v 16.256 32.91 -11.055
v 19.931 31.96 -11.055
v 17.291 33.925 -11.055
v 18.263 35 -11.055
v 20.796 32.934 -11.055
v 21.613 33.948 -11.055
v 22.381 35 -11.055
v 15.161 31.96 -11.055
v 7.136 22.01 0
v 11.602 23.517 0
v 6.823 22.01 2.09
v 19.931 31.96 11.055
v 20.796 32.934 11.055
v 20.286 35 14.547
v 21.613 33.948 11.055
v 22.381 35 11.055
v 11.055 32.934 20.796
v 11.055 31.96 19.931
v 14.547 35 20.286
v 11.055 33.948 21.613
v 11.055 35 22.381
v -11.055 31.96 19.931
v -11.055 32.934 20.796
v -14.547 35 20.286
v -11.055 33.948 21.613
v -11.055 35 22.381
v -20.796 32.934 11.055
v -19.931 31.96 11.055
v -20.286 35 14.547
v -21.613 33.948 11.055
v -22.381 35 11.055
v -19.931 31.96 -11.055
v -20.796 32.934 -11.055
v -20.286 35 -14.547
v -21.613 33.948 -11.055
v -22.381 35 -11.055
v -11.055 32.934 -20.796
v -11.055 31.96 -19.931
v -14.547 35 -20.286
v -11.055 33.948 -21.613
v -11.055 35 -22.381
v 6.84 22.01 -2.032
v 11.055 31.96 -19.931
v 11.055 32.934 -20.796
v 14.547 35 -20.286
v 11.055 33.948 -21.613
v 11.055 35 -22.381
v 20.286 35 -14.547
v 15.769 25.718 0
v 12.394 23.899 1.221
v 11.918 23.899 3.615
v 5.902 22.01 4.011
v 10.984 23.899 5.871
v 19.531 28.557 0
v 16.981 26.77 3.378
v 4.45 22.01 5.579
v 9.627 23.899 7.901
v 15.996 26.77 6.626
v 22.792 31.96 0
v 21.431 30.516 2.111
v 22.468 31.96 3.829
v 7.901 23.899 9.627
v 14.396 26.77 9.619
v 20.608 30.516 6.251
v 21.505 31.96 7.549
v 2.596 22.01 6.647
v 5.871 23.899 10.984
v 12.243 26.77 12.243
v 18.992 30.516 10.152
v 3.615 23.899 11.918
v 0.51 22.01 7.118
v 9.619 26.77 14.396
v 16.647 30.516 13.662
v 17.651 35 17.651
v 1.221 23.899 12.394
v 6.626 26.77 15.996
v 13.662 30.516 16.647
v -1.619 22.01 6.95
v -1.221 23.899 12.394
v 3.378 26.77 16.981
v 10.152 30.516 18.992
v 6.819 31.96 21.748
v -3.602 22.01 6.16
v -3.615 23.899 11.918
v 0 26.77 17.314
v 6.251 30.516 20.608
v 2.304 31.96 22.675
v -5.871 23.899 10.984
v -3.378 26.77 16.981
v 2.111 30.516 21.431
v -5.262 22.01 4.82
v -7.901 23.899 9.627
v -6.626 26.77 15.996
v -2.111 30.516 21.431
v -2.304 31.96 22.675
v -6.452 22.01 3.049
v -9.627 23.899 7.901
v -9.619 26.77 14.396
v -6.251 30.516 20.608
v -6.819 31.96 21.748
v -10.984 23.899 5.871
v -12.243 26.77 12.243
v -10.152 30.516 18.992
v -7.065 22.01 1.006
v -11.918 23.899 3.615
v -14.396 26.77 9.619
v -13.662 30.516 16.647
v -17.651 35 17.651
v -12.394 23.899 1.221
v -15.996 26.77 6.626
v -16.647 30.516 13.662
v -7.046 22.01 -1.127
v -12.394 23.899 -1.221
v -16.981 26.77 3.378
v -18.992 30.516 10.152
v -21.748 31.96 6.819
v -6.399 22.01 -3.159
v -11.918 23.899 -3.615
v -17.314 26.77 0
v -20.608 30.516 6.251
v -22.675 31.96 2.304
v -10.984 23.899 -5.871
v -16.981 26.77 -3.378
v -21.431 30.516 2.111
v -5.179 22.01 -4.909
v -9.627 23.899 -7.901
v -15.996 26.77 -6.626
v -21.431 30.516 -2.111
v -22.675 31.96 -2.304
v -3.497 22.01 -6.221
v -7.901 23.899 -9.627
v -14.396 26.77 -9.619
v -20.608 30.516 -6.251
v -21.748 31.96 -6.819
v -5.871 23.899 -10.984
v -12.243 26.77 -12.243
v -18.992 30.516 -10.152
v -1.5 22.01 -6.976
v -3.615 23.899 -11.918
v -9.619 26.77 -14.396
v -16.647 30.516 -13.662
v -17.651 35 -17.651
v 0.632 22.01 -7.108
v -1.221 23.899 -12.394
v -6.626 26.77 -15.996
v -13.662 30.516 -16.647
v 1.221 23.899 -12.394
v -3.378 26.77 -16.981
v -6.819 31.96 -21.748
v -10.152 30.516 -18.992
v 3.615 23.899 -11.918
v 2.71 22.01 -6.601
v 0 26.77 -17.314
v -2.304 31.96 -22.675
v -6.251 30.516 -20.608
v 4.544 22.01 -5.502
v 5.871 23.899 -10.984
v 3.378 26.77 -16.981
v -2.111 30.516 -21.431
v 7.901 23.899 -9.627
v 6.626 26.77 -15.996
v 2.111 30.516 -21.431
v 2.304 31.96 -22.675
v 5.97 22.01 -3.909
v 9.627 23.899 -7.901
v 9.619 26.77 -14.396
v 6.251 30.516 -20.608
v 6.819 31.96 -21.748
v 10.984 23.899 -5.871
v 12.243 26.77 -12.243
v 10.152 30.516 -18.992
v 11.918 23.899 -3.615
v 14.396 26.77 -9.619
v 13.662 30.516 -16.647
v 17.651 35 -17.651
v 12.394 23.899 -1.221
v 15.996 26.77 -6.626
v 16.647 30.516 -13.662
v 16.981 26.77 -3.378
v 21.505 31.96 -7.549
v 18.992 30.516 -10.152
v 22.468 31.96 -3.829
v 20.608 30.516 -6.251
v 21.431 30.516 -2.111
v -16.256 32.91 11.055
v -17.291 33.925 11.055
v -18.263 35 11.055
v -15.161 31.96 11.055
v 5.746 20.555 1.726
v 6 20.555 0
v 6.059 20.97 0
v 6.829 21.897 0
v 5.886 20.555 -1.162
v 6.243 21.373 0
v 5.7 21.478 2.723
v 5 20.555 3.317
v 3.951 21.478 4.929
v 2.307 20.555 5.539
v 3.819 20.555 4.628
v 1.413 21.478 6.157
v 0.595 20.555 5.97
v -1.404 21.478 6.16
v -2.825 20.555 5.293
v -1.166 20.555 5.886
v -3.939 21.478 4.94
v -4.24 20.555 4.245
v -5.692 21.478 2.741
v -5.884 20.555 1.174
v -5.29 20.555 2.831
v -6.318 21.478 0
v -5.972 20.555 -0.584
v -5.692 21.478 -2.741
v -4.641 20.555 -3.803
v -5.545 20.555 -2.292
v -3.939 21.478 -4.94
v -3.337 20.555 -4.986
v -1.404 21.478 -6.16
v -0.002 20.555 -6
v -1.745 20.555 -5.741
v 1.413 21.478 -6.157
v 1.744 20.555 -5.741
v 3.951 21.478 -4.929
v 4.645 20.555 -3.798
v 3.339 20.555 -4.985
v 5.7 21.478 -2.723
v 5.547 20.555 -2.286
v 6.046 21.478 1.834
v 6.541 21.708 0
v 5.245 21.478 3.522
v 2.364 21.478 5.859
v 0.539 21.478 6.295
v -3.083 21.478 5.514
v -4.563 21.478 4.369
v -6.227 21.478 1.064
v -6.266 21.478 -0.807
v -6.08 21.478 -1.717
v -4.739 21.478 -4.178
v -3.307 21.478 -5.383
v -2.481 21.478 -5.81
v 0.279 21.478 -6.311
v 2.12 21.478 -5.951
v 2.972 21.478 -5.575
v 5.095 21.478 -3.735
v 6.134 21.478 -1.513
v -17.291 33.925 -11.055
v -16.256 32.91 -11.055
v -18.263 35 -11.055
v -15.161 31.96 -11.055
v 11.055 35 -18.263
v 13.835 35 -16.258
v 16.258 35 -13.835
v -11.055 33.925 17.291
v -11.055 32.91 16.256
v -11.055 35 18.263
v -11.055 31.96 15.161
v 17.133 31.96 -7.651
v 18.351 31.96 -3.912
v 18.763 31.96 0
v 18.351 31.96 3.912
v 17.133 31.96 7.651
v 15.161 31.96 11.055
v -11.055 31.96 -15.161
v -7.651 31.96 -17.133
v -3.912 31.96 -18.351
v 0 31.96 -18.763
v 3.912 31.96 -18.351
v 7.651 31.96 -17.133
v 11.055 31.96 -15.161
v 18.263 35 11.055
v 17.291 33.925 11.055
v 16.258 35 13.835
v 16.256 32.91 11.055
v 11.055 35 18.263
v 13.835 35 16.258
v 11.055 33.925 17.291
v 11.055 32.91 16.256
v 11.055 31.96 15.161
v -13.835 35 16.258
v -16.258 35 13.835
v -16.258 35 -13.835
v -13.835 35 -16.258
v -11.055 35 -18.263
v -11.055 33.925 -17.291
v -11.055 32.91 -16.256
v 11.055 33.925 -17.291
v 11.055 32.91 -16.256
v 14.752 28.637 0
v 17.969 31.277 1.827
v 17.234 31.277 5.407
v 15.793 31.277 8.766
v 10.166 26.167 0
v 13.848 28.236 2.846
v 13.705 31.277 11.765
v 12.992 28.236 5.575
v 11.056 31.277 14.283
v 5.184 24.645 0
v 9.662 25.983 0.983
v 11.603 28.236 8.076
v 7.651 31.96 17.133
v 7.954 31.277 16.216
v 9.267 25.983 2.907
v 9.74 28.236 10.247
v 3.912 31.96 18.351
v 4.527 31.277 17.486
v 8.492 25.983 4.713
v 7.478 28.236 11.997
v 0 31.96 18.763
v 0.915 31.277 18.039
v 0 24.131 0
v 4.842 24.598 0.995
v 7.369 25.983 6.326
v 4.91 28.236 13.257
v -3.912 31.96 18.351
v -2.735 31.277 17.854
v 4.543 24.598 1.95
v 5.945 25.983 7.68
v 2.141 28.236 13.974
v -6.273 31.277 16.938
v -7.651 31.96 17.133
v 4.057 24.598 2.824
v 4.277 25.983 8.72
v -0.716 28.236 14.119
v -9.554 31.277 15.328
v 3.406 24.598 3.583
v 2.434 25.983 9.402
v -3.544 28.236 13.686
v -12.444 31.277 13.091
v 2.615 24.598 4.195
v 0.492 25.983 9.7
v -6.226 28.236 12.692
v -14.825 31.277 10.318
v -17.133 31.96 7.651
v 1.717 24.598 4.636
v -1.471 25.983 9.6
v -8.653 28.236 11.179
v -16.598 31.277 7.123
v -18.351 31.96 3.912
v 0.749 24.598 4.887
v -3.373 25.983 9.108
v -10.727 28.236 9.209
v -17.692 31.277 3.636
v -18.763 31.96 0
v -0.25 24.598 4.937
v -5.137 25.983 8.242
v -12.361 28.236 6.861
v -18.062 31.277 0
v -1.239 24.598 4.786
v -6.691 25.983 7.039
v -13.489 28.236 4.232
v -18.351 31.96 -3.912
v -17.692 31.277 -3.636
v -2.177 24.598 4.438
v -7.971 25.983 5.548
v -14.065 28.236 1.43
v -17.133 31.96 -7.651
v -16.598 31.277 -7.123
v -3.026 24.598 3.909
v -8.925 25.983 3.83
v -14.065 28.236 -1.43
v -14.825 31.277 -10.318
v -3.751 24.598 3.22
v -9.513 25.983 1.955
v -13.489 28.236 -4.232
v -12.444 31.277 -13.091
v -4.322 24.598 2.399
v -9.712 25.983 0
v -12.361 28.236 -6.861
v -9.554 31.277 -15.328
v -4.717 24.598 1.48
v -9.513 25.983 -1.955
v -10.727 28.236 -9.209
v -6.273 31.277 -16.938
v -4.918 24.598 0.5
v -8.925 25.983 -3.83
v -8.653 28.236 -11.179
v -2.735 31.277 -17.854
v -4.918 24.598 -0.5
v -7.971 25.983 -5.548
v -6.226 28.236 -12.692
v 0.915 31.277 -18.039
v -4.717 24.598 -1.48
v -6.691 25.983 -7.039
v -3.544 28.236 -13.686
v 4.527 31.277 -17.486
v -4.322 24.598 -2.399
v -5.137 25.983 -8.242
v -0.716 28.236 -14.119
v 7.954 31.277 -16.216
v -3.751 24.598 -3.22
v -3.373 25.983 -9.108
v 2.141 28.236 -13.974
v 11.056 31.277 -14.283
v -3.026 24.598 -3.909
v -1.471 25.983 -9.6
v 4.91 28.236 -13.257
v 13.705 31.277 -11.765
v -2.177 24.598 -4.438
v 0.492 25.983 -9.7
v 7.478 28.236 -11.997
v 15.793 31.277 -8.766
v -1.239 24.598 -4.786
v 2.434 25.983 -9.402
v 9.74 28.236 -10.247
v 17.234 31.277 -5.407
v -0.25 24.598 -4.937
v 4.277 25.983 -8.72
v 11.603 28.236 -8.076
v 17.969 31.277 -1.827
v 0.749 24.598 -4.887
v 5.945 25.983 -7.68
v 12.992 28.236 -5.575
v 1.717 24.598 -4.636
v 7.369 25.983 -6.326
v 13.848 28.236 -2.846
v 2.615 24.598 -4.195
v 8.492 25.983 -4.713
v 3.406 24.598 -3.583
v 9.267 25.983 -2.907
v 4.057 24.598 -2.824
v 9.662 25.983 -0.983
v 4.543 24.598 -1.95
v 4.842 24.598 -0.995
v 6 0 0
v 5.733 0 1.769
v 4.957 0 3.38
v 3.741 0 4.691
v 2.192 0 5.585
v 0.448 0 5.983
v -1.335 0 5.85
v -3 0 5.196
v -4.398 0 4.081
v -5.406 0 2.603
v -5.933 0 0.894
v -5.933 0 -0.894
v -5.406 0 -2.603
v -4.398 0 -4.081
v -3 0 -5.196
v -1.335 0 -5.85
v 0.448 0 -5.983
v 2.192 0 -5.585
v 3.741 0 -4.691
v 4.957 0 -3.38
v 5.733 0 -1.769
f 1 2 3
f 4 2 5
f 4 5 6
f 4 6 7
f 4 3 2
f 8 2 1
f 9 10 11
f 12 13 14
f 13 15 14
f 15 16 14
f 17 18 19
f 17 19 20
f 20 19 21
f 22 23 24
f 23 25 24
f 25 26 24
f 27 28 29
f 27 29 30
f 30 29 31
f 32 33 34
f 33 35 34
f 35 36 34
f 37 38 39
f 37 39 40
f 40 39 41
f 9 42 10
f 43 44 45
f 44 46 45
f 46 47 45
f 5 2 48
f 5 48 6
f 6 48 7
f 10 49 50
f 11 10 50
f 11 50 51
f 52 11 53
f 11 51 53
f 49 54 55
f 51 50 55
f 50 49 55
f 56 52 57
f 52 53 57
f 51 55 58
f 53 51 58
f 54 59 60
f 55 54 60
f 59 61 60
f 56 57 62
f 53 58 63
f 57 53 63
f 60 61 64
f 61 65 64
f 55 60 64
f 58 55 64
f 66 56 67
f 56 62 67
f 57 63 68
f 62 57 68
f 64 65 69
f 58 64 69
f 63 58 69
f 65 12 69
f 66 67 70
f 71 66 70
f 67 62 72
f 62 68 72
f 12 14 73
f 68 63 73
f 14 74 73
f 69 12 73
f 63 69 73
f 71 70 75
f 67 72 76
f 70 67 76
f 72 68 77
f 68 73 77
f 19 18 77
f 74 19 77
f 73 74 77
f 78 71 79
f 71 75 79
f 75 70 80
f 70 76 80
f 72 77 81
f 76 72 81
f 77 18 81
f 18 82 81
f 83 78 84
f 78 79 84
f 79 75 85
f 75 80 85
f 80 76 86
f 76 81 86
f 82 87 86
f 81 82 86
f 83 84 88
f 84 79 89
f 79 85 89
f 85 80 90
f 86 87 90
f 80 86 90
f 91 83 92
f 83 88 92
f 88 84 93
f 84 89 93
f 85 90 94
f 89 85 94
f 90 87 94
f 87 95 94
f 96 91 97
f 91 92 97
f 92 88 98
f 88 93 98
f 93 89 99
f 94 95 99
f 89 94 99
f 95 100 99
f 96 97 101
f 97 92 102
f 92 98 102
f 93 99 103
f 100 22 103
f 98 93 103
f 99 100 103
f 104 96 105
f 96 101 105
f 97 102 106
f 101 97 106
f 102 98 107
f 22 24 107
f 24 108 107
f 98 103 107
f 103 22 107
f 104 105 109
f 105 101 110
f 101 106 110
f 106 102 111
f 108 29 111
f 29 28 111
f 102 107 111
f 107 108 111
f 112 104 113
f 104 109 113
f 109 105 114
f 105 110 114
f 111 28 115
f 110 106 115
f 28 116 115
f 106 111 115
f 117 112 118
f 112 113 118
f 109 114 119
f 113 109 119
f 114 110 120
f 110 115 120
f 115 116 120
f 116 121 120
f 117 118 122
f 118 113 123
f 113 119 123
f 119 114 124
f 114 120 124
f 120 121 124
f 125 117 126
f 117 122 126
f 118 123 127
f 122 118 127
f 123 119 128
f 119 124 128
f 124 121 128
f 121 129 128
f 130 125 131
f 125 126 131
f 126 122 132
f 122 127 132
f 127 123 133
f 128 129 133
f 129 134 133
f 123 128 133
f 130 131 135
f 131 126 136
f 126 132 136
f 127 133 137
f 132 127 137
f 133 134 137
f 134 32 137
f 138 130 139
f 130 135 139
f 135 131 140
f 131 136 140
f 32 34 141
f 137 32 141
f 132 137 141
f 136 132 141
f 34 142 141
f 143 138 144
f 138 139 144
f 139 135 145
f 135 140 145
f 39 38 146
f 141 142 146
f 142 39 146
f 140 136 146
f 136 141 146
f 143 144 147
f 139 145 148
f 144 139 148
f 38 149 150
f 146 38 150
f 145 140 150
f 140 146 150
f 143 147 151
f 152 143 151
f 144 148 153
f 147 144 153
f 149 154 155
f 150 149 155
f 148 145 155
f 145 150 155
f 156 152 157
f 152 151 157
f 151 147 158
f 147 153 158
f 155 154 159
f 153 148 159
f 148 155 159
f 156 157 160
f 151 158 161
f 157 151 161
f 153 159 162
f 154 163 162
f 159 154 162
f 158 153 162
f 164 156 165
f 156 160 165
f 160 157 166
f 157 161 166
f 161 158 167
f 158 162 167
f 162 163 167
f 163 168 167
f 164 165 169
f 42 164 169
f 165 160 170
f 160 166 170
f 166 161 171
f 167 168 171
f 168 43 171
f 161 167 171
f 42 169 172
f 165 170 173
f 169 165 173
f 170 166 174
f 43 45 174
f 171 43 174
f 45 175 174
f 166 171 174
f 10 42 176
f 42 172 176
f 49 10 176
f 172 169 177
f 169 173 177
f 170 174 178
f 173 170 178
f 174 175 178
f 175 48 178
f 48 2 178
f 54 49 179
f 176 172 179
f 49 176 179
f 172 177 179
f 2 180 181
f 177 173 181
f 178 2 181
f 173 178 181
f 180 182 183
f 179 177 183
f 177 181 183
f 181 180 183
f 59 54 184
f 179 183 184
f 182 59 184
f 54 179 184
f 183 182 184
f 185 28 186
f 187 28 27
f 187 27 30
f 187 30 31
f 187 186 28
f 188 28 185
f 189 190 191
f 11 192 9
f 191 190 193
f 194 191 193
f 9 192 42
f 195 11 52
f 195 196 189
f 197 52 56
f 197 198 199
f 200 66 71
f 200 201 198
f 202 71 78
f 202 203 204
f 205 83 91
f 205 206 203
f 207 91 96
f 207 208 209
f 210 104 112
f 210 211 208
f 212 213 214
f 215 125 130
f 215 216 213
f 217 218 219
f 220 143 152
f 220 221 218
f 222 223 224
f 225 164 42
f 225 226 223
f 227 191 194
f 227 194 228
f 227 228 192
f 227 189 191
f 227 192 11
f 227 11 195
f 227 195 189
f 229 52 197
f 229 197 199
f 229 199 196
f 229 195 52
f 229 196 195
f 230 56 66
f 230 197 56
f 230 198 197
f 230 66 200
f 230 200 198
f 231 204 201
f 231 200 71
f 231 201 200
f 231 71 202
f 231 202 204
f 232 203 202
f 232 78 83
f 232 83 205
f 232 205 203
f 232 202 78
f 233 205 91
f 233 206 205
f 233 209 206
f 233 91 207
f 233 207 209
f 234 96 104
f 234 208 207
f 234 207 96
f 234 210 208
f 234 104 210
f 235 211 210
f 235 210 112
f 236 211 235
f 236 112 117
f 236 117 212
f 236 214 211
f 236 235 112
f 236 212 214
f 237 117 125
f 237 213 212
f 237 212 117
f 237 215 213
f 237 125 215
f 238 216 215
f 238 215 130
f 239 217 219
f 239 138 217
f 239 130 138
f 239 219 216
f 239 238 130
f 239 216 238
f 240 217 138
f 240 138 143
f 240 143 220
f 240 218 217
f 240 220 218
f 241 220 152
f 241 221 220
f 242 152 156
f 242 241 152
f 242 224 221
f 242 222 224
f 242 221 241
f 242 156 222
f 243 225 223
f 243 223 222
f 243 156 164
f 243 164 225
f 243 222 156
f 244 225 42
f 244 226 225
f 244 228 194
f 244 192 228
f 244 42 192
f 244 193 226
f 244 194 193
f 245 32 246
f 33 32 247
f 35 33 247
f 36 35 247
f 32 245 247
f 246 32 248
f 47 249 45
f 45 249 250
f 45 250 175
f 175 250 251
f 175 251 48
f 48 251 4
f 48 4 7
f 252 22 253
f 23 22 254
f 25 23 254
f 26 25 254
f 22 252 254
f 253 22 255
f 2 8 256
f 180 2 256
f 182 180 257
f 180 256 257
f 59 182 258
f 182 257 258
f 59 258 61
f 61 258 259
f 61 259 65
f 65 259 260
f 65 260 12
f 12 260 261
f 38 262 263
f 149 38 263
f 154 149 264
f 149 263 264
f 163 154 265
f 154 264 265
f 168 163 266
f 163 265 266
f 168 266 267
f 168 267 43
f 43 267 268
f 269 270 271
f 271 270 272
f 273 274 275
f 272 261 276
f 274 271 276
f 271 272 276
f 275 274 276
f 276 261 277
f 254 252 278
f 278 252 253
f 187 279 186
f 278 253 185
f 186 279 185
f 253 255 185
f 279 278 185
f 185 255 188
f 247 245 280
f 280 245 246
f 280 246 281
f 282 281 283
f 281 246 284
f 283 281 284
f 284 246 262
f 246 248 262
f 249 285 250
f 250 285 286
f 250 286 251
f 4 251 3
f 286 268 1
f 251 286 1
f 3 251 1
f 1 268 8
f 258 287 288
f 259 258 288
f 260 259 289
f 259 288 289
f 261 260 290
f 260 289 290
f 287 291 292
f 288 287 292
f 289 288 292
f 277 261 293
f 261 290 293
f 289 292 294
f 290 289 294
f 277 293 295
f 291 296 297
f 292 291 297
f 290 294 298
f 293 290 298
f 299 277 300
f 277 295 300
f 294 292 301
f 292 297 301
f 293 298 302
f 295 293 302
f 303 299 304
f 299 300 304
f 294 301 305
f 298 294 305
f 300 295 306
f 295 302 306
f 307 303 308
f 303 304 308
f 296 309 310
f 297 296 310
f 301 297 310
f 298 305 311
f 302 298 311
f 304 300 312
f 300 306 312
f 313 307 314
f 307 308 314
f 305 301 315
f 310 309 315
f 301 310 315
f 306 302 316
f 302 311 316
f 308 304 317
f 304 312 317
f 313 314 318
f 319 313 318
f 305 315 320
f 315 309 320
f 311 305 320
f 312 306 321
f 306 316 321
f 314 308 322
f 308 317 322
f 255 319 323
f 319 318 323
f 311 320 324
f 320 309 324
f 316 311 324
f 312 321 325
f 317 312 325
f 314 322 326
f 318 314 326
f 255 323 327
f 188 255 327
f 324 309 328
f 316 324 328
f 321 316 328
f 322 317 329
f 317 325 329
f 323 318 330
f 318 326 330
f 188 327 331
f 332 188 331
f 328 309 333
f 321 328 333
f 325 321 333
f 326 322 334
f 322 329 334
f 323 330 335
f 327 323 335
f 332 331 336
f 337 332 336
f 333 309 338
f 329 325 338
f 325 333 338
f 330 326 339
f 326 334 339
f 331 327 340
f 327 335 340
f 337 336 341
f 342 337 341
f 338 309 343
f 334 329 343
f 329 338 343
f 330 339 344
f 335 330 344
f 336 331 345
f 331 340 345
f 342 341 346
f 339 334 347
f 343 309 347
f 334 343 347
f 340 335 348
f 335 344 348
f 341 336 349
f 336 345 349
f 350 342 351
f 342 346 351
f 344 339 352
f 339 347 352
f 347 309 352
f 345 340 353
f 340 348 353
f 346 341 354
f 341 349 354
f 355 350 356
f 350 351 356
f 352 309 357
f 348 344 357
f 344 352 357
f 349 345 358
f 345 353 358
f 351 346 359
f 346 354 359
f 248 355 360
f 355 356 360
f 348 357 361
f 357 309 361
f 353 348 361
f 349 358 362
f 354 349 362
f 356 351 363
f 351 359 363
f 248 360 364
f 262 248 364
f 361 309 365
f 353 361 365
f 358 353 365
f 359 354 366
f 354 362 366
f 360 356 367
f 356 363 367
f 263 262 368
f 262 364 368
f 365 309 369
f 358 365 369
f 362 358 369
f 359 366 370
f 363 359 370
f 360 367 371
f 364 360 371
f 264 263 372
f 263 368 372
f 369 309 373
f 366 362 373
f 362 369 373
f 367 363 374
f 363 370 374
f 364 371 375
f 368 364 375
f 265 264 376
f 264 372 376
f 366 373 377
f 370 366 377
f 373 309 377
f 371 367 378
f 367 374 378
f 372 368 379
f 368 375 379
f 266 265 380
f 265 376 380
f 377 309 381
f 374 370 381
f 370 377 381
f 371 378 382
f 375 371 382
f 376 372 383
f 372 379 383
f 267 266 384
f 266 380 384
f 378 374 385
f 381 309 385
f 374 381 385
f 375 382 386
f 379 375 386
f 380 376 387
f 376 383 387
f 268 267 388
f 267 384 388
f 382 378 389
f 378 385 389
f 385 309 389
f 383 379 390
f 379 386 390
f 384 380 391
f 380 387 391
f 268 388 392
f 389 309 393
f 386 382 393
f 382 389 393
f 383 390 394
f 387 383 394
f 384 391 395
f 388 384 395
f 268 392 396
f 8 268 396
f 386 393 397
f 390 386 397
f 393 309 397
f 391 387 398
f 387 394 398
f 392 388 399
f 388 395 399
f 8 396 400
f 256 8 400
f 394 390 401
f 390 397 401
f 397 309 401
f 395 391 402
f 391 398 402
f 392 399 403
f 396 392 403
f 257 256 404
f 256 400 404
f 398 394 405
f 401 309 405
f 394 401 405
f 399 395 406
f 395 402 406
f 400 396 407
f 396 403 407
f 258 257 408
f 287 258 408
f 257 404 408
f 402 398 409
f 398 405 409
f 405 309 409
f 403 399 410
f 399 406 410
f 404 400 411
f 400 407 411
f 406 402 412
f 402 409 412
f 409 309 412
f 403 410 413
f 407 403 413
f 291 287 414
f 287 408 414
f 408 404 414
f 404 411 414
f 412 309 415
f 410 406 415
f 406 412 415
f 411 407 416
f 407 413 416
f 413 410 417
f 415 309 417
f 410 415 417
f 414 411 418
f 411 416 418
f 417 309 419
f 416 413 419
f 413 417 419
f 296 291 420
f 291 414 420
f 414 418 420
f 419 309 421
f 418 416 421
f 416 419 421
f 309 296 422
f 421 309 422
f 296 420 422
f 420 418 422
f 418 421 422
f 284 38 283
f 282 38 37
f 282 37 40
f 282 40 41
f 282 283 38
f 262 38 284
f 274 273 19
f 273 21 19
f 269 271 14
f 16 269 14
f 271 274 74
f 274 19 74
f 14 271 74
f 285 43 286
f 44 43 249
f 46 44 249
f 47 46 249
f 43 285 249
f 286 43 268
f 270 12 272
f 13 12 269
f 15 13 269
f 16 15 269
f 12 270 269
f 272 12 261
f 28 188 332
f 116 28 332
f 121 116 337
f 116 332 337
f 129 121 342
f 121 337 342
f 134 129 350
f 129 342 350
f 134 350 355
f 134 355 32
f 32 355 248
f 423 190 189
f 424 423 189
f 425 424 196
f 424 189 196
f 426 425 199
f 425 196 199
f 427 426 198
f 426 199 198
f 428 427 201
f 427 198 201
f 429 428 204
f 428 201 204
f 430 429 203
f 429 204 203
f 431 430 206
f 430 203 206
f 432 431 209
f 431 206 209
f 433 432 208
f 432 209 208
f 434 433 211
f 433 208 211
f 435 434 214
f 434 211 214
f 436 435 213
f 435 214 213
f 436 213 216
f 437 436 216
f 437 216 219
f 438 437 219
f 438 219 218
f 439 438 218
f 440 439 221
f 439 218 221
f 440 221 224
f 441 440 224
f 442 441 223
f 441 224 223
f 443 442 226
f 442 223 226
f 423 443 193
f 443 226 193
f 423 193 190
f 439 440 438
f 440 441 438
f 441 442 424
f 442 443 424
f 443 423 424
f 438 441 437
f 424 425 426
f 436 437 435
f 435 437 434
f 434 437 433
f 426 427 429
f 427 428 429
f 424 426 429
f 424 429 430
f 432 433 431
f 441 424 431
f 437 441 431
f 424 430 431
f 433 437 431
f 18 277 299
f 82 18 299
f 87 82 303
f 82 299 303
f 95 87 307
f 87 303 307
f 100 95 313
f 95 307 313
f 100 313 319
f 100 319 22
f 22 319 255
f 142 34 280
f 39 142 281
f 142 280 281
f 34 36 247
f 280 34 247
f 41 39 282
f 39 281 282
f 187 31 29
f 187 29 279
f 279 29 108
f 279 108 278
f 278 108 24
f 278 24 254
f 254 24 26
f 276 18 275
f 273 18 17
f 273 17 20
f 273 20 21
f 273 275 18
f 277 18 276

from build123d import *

# Parameters (mm, degrees)
CUT_EXTRUDE1_REACH = 51.712
SKETCH2_W          = 22.11
SKETCH2_H          = 3.04
CIRPATTERN1_COUNT  = 4
FILLET1_R          = 1.5


with BuildPart() as part:
    # Sketch1 → Revolve1 (revolve)
    with BuildSketch(Plane.XY):
        with BuildLine():
            Line((0, 24.131243893), (0, 21.131243893))
            Line((0, 21.131243893), (0, 0))
            Line((0, 0), (6, 0))
            Line((6, 0), (6, 21.75))
            ThreePointArc((6, 21.75), (16.839361195, 26.431536124), (24.962781559, 35))
            Line((24.962781559, 35), (21.348078676, 35))
            ThreePointArc((21.348078676, 35), (11.977795315, 27.004824289), (0, 24.131243893))
        make_face()
    revolve(axis=Axis((0, 21.131243893, 0), (0, -1, 0)))

    # Sketch2 → Cut-Extrude1 (cut, up to next)
    with BuildSketch(Plane.XY, mode=Mode.PRIVATE) as cut_extrude1_sk1:
        with Locations((0, 33.48)):
            Rectangle(SKETCH2_W, SKETCH2_H)
    cut_extrude1_tool1 = extrude(cut_extrude1_sk1.sketch, amount=-CUT_EXTRUDE1_REACH, mode=Mode.PRIVATE) & part.part
    cut_extrude1 = cut_extrude1_tool1.solids().sort_by_distance((0, 33.48, 0))[0]
    add(cut_extrude1, mode=Mode.SUBTRACT)

    # CirPattern1: Cut-Extrude1 ×4 about axis
    cirpattern1_axis = Axis((0, 0, 0), (0, 1, 0))
    for i in range(1, CIRPATTERN1_COUNT):
        add(cut_extrude1.rotate(cirpattern1_axis, i * 360 / CIRPATTERN1_COUNT), mode=Mode.SUBTRACT)

    # Fillet1
    fillet1_edges = [part.edges().sort_by_distance(p)[0] for p in [
        (-6, 21.75, 0),
    ]]
    fillet(fillet1_edges, radius=FILLET1_R)


solid = part.part
